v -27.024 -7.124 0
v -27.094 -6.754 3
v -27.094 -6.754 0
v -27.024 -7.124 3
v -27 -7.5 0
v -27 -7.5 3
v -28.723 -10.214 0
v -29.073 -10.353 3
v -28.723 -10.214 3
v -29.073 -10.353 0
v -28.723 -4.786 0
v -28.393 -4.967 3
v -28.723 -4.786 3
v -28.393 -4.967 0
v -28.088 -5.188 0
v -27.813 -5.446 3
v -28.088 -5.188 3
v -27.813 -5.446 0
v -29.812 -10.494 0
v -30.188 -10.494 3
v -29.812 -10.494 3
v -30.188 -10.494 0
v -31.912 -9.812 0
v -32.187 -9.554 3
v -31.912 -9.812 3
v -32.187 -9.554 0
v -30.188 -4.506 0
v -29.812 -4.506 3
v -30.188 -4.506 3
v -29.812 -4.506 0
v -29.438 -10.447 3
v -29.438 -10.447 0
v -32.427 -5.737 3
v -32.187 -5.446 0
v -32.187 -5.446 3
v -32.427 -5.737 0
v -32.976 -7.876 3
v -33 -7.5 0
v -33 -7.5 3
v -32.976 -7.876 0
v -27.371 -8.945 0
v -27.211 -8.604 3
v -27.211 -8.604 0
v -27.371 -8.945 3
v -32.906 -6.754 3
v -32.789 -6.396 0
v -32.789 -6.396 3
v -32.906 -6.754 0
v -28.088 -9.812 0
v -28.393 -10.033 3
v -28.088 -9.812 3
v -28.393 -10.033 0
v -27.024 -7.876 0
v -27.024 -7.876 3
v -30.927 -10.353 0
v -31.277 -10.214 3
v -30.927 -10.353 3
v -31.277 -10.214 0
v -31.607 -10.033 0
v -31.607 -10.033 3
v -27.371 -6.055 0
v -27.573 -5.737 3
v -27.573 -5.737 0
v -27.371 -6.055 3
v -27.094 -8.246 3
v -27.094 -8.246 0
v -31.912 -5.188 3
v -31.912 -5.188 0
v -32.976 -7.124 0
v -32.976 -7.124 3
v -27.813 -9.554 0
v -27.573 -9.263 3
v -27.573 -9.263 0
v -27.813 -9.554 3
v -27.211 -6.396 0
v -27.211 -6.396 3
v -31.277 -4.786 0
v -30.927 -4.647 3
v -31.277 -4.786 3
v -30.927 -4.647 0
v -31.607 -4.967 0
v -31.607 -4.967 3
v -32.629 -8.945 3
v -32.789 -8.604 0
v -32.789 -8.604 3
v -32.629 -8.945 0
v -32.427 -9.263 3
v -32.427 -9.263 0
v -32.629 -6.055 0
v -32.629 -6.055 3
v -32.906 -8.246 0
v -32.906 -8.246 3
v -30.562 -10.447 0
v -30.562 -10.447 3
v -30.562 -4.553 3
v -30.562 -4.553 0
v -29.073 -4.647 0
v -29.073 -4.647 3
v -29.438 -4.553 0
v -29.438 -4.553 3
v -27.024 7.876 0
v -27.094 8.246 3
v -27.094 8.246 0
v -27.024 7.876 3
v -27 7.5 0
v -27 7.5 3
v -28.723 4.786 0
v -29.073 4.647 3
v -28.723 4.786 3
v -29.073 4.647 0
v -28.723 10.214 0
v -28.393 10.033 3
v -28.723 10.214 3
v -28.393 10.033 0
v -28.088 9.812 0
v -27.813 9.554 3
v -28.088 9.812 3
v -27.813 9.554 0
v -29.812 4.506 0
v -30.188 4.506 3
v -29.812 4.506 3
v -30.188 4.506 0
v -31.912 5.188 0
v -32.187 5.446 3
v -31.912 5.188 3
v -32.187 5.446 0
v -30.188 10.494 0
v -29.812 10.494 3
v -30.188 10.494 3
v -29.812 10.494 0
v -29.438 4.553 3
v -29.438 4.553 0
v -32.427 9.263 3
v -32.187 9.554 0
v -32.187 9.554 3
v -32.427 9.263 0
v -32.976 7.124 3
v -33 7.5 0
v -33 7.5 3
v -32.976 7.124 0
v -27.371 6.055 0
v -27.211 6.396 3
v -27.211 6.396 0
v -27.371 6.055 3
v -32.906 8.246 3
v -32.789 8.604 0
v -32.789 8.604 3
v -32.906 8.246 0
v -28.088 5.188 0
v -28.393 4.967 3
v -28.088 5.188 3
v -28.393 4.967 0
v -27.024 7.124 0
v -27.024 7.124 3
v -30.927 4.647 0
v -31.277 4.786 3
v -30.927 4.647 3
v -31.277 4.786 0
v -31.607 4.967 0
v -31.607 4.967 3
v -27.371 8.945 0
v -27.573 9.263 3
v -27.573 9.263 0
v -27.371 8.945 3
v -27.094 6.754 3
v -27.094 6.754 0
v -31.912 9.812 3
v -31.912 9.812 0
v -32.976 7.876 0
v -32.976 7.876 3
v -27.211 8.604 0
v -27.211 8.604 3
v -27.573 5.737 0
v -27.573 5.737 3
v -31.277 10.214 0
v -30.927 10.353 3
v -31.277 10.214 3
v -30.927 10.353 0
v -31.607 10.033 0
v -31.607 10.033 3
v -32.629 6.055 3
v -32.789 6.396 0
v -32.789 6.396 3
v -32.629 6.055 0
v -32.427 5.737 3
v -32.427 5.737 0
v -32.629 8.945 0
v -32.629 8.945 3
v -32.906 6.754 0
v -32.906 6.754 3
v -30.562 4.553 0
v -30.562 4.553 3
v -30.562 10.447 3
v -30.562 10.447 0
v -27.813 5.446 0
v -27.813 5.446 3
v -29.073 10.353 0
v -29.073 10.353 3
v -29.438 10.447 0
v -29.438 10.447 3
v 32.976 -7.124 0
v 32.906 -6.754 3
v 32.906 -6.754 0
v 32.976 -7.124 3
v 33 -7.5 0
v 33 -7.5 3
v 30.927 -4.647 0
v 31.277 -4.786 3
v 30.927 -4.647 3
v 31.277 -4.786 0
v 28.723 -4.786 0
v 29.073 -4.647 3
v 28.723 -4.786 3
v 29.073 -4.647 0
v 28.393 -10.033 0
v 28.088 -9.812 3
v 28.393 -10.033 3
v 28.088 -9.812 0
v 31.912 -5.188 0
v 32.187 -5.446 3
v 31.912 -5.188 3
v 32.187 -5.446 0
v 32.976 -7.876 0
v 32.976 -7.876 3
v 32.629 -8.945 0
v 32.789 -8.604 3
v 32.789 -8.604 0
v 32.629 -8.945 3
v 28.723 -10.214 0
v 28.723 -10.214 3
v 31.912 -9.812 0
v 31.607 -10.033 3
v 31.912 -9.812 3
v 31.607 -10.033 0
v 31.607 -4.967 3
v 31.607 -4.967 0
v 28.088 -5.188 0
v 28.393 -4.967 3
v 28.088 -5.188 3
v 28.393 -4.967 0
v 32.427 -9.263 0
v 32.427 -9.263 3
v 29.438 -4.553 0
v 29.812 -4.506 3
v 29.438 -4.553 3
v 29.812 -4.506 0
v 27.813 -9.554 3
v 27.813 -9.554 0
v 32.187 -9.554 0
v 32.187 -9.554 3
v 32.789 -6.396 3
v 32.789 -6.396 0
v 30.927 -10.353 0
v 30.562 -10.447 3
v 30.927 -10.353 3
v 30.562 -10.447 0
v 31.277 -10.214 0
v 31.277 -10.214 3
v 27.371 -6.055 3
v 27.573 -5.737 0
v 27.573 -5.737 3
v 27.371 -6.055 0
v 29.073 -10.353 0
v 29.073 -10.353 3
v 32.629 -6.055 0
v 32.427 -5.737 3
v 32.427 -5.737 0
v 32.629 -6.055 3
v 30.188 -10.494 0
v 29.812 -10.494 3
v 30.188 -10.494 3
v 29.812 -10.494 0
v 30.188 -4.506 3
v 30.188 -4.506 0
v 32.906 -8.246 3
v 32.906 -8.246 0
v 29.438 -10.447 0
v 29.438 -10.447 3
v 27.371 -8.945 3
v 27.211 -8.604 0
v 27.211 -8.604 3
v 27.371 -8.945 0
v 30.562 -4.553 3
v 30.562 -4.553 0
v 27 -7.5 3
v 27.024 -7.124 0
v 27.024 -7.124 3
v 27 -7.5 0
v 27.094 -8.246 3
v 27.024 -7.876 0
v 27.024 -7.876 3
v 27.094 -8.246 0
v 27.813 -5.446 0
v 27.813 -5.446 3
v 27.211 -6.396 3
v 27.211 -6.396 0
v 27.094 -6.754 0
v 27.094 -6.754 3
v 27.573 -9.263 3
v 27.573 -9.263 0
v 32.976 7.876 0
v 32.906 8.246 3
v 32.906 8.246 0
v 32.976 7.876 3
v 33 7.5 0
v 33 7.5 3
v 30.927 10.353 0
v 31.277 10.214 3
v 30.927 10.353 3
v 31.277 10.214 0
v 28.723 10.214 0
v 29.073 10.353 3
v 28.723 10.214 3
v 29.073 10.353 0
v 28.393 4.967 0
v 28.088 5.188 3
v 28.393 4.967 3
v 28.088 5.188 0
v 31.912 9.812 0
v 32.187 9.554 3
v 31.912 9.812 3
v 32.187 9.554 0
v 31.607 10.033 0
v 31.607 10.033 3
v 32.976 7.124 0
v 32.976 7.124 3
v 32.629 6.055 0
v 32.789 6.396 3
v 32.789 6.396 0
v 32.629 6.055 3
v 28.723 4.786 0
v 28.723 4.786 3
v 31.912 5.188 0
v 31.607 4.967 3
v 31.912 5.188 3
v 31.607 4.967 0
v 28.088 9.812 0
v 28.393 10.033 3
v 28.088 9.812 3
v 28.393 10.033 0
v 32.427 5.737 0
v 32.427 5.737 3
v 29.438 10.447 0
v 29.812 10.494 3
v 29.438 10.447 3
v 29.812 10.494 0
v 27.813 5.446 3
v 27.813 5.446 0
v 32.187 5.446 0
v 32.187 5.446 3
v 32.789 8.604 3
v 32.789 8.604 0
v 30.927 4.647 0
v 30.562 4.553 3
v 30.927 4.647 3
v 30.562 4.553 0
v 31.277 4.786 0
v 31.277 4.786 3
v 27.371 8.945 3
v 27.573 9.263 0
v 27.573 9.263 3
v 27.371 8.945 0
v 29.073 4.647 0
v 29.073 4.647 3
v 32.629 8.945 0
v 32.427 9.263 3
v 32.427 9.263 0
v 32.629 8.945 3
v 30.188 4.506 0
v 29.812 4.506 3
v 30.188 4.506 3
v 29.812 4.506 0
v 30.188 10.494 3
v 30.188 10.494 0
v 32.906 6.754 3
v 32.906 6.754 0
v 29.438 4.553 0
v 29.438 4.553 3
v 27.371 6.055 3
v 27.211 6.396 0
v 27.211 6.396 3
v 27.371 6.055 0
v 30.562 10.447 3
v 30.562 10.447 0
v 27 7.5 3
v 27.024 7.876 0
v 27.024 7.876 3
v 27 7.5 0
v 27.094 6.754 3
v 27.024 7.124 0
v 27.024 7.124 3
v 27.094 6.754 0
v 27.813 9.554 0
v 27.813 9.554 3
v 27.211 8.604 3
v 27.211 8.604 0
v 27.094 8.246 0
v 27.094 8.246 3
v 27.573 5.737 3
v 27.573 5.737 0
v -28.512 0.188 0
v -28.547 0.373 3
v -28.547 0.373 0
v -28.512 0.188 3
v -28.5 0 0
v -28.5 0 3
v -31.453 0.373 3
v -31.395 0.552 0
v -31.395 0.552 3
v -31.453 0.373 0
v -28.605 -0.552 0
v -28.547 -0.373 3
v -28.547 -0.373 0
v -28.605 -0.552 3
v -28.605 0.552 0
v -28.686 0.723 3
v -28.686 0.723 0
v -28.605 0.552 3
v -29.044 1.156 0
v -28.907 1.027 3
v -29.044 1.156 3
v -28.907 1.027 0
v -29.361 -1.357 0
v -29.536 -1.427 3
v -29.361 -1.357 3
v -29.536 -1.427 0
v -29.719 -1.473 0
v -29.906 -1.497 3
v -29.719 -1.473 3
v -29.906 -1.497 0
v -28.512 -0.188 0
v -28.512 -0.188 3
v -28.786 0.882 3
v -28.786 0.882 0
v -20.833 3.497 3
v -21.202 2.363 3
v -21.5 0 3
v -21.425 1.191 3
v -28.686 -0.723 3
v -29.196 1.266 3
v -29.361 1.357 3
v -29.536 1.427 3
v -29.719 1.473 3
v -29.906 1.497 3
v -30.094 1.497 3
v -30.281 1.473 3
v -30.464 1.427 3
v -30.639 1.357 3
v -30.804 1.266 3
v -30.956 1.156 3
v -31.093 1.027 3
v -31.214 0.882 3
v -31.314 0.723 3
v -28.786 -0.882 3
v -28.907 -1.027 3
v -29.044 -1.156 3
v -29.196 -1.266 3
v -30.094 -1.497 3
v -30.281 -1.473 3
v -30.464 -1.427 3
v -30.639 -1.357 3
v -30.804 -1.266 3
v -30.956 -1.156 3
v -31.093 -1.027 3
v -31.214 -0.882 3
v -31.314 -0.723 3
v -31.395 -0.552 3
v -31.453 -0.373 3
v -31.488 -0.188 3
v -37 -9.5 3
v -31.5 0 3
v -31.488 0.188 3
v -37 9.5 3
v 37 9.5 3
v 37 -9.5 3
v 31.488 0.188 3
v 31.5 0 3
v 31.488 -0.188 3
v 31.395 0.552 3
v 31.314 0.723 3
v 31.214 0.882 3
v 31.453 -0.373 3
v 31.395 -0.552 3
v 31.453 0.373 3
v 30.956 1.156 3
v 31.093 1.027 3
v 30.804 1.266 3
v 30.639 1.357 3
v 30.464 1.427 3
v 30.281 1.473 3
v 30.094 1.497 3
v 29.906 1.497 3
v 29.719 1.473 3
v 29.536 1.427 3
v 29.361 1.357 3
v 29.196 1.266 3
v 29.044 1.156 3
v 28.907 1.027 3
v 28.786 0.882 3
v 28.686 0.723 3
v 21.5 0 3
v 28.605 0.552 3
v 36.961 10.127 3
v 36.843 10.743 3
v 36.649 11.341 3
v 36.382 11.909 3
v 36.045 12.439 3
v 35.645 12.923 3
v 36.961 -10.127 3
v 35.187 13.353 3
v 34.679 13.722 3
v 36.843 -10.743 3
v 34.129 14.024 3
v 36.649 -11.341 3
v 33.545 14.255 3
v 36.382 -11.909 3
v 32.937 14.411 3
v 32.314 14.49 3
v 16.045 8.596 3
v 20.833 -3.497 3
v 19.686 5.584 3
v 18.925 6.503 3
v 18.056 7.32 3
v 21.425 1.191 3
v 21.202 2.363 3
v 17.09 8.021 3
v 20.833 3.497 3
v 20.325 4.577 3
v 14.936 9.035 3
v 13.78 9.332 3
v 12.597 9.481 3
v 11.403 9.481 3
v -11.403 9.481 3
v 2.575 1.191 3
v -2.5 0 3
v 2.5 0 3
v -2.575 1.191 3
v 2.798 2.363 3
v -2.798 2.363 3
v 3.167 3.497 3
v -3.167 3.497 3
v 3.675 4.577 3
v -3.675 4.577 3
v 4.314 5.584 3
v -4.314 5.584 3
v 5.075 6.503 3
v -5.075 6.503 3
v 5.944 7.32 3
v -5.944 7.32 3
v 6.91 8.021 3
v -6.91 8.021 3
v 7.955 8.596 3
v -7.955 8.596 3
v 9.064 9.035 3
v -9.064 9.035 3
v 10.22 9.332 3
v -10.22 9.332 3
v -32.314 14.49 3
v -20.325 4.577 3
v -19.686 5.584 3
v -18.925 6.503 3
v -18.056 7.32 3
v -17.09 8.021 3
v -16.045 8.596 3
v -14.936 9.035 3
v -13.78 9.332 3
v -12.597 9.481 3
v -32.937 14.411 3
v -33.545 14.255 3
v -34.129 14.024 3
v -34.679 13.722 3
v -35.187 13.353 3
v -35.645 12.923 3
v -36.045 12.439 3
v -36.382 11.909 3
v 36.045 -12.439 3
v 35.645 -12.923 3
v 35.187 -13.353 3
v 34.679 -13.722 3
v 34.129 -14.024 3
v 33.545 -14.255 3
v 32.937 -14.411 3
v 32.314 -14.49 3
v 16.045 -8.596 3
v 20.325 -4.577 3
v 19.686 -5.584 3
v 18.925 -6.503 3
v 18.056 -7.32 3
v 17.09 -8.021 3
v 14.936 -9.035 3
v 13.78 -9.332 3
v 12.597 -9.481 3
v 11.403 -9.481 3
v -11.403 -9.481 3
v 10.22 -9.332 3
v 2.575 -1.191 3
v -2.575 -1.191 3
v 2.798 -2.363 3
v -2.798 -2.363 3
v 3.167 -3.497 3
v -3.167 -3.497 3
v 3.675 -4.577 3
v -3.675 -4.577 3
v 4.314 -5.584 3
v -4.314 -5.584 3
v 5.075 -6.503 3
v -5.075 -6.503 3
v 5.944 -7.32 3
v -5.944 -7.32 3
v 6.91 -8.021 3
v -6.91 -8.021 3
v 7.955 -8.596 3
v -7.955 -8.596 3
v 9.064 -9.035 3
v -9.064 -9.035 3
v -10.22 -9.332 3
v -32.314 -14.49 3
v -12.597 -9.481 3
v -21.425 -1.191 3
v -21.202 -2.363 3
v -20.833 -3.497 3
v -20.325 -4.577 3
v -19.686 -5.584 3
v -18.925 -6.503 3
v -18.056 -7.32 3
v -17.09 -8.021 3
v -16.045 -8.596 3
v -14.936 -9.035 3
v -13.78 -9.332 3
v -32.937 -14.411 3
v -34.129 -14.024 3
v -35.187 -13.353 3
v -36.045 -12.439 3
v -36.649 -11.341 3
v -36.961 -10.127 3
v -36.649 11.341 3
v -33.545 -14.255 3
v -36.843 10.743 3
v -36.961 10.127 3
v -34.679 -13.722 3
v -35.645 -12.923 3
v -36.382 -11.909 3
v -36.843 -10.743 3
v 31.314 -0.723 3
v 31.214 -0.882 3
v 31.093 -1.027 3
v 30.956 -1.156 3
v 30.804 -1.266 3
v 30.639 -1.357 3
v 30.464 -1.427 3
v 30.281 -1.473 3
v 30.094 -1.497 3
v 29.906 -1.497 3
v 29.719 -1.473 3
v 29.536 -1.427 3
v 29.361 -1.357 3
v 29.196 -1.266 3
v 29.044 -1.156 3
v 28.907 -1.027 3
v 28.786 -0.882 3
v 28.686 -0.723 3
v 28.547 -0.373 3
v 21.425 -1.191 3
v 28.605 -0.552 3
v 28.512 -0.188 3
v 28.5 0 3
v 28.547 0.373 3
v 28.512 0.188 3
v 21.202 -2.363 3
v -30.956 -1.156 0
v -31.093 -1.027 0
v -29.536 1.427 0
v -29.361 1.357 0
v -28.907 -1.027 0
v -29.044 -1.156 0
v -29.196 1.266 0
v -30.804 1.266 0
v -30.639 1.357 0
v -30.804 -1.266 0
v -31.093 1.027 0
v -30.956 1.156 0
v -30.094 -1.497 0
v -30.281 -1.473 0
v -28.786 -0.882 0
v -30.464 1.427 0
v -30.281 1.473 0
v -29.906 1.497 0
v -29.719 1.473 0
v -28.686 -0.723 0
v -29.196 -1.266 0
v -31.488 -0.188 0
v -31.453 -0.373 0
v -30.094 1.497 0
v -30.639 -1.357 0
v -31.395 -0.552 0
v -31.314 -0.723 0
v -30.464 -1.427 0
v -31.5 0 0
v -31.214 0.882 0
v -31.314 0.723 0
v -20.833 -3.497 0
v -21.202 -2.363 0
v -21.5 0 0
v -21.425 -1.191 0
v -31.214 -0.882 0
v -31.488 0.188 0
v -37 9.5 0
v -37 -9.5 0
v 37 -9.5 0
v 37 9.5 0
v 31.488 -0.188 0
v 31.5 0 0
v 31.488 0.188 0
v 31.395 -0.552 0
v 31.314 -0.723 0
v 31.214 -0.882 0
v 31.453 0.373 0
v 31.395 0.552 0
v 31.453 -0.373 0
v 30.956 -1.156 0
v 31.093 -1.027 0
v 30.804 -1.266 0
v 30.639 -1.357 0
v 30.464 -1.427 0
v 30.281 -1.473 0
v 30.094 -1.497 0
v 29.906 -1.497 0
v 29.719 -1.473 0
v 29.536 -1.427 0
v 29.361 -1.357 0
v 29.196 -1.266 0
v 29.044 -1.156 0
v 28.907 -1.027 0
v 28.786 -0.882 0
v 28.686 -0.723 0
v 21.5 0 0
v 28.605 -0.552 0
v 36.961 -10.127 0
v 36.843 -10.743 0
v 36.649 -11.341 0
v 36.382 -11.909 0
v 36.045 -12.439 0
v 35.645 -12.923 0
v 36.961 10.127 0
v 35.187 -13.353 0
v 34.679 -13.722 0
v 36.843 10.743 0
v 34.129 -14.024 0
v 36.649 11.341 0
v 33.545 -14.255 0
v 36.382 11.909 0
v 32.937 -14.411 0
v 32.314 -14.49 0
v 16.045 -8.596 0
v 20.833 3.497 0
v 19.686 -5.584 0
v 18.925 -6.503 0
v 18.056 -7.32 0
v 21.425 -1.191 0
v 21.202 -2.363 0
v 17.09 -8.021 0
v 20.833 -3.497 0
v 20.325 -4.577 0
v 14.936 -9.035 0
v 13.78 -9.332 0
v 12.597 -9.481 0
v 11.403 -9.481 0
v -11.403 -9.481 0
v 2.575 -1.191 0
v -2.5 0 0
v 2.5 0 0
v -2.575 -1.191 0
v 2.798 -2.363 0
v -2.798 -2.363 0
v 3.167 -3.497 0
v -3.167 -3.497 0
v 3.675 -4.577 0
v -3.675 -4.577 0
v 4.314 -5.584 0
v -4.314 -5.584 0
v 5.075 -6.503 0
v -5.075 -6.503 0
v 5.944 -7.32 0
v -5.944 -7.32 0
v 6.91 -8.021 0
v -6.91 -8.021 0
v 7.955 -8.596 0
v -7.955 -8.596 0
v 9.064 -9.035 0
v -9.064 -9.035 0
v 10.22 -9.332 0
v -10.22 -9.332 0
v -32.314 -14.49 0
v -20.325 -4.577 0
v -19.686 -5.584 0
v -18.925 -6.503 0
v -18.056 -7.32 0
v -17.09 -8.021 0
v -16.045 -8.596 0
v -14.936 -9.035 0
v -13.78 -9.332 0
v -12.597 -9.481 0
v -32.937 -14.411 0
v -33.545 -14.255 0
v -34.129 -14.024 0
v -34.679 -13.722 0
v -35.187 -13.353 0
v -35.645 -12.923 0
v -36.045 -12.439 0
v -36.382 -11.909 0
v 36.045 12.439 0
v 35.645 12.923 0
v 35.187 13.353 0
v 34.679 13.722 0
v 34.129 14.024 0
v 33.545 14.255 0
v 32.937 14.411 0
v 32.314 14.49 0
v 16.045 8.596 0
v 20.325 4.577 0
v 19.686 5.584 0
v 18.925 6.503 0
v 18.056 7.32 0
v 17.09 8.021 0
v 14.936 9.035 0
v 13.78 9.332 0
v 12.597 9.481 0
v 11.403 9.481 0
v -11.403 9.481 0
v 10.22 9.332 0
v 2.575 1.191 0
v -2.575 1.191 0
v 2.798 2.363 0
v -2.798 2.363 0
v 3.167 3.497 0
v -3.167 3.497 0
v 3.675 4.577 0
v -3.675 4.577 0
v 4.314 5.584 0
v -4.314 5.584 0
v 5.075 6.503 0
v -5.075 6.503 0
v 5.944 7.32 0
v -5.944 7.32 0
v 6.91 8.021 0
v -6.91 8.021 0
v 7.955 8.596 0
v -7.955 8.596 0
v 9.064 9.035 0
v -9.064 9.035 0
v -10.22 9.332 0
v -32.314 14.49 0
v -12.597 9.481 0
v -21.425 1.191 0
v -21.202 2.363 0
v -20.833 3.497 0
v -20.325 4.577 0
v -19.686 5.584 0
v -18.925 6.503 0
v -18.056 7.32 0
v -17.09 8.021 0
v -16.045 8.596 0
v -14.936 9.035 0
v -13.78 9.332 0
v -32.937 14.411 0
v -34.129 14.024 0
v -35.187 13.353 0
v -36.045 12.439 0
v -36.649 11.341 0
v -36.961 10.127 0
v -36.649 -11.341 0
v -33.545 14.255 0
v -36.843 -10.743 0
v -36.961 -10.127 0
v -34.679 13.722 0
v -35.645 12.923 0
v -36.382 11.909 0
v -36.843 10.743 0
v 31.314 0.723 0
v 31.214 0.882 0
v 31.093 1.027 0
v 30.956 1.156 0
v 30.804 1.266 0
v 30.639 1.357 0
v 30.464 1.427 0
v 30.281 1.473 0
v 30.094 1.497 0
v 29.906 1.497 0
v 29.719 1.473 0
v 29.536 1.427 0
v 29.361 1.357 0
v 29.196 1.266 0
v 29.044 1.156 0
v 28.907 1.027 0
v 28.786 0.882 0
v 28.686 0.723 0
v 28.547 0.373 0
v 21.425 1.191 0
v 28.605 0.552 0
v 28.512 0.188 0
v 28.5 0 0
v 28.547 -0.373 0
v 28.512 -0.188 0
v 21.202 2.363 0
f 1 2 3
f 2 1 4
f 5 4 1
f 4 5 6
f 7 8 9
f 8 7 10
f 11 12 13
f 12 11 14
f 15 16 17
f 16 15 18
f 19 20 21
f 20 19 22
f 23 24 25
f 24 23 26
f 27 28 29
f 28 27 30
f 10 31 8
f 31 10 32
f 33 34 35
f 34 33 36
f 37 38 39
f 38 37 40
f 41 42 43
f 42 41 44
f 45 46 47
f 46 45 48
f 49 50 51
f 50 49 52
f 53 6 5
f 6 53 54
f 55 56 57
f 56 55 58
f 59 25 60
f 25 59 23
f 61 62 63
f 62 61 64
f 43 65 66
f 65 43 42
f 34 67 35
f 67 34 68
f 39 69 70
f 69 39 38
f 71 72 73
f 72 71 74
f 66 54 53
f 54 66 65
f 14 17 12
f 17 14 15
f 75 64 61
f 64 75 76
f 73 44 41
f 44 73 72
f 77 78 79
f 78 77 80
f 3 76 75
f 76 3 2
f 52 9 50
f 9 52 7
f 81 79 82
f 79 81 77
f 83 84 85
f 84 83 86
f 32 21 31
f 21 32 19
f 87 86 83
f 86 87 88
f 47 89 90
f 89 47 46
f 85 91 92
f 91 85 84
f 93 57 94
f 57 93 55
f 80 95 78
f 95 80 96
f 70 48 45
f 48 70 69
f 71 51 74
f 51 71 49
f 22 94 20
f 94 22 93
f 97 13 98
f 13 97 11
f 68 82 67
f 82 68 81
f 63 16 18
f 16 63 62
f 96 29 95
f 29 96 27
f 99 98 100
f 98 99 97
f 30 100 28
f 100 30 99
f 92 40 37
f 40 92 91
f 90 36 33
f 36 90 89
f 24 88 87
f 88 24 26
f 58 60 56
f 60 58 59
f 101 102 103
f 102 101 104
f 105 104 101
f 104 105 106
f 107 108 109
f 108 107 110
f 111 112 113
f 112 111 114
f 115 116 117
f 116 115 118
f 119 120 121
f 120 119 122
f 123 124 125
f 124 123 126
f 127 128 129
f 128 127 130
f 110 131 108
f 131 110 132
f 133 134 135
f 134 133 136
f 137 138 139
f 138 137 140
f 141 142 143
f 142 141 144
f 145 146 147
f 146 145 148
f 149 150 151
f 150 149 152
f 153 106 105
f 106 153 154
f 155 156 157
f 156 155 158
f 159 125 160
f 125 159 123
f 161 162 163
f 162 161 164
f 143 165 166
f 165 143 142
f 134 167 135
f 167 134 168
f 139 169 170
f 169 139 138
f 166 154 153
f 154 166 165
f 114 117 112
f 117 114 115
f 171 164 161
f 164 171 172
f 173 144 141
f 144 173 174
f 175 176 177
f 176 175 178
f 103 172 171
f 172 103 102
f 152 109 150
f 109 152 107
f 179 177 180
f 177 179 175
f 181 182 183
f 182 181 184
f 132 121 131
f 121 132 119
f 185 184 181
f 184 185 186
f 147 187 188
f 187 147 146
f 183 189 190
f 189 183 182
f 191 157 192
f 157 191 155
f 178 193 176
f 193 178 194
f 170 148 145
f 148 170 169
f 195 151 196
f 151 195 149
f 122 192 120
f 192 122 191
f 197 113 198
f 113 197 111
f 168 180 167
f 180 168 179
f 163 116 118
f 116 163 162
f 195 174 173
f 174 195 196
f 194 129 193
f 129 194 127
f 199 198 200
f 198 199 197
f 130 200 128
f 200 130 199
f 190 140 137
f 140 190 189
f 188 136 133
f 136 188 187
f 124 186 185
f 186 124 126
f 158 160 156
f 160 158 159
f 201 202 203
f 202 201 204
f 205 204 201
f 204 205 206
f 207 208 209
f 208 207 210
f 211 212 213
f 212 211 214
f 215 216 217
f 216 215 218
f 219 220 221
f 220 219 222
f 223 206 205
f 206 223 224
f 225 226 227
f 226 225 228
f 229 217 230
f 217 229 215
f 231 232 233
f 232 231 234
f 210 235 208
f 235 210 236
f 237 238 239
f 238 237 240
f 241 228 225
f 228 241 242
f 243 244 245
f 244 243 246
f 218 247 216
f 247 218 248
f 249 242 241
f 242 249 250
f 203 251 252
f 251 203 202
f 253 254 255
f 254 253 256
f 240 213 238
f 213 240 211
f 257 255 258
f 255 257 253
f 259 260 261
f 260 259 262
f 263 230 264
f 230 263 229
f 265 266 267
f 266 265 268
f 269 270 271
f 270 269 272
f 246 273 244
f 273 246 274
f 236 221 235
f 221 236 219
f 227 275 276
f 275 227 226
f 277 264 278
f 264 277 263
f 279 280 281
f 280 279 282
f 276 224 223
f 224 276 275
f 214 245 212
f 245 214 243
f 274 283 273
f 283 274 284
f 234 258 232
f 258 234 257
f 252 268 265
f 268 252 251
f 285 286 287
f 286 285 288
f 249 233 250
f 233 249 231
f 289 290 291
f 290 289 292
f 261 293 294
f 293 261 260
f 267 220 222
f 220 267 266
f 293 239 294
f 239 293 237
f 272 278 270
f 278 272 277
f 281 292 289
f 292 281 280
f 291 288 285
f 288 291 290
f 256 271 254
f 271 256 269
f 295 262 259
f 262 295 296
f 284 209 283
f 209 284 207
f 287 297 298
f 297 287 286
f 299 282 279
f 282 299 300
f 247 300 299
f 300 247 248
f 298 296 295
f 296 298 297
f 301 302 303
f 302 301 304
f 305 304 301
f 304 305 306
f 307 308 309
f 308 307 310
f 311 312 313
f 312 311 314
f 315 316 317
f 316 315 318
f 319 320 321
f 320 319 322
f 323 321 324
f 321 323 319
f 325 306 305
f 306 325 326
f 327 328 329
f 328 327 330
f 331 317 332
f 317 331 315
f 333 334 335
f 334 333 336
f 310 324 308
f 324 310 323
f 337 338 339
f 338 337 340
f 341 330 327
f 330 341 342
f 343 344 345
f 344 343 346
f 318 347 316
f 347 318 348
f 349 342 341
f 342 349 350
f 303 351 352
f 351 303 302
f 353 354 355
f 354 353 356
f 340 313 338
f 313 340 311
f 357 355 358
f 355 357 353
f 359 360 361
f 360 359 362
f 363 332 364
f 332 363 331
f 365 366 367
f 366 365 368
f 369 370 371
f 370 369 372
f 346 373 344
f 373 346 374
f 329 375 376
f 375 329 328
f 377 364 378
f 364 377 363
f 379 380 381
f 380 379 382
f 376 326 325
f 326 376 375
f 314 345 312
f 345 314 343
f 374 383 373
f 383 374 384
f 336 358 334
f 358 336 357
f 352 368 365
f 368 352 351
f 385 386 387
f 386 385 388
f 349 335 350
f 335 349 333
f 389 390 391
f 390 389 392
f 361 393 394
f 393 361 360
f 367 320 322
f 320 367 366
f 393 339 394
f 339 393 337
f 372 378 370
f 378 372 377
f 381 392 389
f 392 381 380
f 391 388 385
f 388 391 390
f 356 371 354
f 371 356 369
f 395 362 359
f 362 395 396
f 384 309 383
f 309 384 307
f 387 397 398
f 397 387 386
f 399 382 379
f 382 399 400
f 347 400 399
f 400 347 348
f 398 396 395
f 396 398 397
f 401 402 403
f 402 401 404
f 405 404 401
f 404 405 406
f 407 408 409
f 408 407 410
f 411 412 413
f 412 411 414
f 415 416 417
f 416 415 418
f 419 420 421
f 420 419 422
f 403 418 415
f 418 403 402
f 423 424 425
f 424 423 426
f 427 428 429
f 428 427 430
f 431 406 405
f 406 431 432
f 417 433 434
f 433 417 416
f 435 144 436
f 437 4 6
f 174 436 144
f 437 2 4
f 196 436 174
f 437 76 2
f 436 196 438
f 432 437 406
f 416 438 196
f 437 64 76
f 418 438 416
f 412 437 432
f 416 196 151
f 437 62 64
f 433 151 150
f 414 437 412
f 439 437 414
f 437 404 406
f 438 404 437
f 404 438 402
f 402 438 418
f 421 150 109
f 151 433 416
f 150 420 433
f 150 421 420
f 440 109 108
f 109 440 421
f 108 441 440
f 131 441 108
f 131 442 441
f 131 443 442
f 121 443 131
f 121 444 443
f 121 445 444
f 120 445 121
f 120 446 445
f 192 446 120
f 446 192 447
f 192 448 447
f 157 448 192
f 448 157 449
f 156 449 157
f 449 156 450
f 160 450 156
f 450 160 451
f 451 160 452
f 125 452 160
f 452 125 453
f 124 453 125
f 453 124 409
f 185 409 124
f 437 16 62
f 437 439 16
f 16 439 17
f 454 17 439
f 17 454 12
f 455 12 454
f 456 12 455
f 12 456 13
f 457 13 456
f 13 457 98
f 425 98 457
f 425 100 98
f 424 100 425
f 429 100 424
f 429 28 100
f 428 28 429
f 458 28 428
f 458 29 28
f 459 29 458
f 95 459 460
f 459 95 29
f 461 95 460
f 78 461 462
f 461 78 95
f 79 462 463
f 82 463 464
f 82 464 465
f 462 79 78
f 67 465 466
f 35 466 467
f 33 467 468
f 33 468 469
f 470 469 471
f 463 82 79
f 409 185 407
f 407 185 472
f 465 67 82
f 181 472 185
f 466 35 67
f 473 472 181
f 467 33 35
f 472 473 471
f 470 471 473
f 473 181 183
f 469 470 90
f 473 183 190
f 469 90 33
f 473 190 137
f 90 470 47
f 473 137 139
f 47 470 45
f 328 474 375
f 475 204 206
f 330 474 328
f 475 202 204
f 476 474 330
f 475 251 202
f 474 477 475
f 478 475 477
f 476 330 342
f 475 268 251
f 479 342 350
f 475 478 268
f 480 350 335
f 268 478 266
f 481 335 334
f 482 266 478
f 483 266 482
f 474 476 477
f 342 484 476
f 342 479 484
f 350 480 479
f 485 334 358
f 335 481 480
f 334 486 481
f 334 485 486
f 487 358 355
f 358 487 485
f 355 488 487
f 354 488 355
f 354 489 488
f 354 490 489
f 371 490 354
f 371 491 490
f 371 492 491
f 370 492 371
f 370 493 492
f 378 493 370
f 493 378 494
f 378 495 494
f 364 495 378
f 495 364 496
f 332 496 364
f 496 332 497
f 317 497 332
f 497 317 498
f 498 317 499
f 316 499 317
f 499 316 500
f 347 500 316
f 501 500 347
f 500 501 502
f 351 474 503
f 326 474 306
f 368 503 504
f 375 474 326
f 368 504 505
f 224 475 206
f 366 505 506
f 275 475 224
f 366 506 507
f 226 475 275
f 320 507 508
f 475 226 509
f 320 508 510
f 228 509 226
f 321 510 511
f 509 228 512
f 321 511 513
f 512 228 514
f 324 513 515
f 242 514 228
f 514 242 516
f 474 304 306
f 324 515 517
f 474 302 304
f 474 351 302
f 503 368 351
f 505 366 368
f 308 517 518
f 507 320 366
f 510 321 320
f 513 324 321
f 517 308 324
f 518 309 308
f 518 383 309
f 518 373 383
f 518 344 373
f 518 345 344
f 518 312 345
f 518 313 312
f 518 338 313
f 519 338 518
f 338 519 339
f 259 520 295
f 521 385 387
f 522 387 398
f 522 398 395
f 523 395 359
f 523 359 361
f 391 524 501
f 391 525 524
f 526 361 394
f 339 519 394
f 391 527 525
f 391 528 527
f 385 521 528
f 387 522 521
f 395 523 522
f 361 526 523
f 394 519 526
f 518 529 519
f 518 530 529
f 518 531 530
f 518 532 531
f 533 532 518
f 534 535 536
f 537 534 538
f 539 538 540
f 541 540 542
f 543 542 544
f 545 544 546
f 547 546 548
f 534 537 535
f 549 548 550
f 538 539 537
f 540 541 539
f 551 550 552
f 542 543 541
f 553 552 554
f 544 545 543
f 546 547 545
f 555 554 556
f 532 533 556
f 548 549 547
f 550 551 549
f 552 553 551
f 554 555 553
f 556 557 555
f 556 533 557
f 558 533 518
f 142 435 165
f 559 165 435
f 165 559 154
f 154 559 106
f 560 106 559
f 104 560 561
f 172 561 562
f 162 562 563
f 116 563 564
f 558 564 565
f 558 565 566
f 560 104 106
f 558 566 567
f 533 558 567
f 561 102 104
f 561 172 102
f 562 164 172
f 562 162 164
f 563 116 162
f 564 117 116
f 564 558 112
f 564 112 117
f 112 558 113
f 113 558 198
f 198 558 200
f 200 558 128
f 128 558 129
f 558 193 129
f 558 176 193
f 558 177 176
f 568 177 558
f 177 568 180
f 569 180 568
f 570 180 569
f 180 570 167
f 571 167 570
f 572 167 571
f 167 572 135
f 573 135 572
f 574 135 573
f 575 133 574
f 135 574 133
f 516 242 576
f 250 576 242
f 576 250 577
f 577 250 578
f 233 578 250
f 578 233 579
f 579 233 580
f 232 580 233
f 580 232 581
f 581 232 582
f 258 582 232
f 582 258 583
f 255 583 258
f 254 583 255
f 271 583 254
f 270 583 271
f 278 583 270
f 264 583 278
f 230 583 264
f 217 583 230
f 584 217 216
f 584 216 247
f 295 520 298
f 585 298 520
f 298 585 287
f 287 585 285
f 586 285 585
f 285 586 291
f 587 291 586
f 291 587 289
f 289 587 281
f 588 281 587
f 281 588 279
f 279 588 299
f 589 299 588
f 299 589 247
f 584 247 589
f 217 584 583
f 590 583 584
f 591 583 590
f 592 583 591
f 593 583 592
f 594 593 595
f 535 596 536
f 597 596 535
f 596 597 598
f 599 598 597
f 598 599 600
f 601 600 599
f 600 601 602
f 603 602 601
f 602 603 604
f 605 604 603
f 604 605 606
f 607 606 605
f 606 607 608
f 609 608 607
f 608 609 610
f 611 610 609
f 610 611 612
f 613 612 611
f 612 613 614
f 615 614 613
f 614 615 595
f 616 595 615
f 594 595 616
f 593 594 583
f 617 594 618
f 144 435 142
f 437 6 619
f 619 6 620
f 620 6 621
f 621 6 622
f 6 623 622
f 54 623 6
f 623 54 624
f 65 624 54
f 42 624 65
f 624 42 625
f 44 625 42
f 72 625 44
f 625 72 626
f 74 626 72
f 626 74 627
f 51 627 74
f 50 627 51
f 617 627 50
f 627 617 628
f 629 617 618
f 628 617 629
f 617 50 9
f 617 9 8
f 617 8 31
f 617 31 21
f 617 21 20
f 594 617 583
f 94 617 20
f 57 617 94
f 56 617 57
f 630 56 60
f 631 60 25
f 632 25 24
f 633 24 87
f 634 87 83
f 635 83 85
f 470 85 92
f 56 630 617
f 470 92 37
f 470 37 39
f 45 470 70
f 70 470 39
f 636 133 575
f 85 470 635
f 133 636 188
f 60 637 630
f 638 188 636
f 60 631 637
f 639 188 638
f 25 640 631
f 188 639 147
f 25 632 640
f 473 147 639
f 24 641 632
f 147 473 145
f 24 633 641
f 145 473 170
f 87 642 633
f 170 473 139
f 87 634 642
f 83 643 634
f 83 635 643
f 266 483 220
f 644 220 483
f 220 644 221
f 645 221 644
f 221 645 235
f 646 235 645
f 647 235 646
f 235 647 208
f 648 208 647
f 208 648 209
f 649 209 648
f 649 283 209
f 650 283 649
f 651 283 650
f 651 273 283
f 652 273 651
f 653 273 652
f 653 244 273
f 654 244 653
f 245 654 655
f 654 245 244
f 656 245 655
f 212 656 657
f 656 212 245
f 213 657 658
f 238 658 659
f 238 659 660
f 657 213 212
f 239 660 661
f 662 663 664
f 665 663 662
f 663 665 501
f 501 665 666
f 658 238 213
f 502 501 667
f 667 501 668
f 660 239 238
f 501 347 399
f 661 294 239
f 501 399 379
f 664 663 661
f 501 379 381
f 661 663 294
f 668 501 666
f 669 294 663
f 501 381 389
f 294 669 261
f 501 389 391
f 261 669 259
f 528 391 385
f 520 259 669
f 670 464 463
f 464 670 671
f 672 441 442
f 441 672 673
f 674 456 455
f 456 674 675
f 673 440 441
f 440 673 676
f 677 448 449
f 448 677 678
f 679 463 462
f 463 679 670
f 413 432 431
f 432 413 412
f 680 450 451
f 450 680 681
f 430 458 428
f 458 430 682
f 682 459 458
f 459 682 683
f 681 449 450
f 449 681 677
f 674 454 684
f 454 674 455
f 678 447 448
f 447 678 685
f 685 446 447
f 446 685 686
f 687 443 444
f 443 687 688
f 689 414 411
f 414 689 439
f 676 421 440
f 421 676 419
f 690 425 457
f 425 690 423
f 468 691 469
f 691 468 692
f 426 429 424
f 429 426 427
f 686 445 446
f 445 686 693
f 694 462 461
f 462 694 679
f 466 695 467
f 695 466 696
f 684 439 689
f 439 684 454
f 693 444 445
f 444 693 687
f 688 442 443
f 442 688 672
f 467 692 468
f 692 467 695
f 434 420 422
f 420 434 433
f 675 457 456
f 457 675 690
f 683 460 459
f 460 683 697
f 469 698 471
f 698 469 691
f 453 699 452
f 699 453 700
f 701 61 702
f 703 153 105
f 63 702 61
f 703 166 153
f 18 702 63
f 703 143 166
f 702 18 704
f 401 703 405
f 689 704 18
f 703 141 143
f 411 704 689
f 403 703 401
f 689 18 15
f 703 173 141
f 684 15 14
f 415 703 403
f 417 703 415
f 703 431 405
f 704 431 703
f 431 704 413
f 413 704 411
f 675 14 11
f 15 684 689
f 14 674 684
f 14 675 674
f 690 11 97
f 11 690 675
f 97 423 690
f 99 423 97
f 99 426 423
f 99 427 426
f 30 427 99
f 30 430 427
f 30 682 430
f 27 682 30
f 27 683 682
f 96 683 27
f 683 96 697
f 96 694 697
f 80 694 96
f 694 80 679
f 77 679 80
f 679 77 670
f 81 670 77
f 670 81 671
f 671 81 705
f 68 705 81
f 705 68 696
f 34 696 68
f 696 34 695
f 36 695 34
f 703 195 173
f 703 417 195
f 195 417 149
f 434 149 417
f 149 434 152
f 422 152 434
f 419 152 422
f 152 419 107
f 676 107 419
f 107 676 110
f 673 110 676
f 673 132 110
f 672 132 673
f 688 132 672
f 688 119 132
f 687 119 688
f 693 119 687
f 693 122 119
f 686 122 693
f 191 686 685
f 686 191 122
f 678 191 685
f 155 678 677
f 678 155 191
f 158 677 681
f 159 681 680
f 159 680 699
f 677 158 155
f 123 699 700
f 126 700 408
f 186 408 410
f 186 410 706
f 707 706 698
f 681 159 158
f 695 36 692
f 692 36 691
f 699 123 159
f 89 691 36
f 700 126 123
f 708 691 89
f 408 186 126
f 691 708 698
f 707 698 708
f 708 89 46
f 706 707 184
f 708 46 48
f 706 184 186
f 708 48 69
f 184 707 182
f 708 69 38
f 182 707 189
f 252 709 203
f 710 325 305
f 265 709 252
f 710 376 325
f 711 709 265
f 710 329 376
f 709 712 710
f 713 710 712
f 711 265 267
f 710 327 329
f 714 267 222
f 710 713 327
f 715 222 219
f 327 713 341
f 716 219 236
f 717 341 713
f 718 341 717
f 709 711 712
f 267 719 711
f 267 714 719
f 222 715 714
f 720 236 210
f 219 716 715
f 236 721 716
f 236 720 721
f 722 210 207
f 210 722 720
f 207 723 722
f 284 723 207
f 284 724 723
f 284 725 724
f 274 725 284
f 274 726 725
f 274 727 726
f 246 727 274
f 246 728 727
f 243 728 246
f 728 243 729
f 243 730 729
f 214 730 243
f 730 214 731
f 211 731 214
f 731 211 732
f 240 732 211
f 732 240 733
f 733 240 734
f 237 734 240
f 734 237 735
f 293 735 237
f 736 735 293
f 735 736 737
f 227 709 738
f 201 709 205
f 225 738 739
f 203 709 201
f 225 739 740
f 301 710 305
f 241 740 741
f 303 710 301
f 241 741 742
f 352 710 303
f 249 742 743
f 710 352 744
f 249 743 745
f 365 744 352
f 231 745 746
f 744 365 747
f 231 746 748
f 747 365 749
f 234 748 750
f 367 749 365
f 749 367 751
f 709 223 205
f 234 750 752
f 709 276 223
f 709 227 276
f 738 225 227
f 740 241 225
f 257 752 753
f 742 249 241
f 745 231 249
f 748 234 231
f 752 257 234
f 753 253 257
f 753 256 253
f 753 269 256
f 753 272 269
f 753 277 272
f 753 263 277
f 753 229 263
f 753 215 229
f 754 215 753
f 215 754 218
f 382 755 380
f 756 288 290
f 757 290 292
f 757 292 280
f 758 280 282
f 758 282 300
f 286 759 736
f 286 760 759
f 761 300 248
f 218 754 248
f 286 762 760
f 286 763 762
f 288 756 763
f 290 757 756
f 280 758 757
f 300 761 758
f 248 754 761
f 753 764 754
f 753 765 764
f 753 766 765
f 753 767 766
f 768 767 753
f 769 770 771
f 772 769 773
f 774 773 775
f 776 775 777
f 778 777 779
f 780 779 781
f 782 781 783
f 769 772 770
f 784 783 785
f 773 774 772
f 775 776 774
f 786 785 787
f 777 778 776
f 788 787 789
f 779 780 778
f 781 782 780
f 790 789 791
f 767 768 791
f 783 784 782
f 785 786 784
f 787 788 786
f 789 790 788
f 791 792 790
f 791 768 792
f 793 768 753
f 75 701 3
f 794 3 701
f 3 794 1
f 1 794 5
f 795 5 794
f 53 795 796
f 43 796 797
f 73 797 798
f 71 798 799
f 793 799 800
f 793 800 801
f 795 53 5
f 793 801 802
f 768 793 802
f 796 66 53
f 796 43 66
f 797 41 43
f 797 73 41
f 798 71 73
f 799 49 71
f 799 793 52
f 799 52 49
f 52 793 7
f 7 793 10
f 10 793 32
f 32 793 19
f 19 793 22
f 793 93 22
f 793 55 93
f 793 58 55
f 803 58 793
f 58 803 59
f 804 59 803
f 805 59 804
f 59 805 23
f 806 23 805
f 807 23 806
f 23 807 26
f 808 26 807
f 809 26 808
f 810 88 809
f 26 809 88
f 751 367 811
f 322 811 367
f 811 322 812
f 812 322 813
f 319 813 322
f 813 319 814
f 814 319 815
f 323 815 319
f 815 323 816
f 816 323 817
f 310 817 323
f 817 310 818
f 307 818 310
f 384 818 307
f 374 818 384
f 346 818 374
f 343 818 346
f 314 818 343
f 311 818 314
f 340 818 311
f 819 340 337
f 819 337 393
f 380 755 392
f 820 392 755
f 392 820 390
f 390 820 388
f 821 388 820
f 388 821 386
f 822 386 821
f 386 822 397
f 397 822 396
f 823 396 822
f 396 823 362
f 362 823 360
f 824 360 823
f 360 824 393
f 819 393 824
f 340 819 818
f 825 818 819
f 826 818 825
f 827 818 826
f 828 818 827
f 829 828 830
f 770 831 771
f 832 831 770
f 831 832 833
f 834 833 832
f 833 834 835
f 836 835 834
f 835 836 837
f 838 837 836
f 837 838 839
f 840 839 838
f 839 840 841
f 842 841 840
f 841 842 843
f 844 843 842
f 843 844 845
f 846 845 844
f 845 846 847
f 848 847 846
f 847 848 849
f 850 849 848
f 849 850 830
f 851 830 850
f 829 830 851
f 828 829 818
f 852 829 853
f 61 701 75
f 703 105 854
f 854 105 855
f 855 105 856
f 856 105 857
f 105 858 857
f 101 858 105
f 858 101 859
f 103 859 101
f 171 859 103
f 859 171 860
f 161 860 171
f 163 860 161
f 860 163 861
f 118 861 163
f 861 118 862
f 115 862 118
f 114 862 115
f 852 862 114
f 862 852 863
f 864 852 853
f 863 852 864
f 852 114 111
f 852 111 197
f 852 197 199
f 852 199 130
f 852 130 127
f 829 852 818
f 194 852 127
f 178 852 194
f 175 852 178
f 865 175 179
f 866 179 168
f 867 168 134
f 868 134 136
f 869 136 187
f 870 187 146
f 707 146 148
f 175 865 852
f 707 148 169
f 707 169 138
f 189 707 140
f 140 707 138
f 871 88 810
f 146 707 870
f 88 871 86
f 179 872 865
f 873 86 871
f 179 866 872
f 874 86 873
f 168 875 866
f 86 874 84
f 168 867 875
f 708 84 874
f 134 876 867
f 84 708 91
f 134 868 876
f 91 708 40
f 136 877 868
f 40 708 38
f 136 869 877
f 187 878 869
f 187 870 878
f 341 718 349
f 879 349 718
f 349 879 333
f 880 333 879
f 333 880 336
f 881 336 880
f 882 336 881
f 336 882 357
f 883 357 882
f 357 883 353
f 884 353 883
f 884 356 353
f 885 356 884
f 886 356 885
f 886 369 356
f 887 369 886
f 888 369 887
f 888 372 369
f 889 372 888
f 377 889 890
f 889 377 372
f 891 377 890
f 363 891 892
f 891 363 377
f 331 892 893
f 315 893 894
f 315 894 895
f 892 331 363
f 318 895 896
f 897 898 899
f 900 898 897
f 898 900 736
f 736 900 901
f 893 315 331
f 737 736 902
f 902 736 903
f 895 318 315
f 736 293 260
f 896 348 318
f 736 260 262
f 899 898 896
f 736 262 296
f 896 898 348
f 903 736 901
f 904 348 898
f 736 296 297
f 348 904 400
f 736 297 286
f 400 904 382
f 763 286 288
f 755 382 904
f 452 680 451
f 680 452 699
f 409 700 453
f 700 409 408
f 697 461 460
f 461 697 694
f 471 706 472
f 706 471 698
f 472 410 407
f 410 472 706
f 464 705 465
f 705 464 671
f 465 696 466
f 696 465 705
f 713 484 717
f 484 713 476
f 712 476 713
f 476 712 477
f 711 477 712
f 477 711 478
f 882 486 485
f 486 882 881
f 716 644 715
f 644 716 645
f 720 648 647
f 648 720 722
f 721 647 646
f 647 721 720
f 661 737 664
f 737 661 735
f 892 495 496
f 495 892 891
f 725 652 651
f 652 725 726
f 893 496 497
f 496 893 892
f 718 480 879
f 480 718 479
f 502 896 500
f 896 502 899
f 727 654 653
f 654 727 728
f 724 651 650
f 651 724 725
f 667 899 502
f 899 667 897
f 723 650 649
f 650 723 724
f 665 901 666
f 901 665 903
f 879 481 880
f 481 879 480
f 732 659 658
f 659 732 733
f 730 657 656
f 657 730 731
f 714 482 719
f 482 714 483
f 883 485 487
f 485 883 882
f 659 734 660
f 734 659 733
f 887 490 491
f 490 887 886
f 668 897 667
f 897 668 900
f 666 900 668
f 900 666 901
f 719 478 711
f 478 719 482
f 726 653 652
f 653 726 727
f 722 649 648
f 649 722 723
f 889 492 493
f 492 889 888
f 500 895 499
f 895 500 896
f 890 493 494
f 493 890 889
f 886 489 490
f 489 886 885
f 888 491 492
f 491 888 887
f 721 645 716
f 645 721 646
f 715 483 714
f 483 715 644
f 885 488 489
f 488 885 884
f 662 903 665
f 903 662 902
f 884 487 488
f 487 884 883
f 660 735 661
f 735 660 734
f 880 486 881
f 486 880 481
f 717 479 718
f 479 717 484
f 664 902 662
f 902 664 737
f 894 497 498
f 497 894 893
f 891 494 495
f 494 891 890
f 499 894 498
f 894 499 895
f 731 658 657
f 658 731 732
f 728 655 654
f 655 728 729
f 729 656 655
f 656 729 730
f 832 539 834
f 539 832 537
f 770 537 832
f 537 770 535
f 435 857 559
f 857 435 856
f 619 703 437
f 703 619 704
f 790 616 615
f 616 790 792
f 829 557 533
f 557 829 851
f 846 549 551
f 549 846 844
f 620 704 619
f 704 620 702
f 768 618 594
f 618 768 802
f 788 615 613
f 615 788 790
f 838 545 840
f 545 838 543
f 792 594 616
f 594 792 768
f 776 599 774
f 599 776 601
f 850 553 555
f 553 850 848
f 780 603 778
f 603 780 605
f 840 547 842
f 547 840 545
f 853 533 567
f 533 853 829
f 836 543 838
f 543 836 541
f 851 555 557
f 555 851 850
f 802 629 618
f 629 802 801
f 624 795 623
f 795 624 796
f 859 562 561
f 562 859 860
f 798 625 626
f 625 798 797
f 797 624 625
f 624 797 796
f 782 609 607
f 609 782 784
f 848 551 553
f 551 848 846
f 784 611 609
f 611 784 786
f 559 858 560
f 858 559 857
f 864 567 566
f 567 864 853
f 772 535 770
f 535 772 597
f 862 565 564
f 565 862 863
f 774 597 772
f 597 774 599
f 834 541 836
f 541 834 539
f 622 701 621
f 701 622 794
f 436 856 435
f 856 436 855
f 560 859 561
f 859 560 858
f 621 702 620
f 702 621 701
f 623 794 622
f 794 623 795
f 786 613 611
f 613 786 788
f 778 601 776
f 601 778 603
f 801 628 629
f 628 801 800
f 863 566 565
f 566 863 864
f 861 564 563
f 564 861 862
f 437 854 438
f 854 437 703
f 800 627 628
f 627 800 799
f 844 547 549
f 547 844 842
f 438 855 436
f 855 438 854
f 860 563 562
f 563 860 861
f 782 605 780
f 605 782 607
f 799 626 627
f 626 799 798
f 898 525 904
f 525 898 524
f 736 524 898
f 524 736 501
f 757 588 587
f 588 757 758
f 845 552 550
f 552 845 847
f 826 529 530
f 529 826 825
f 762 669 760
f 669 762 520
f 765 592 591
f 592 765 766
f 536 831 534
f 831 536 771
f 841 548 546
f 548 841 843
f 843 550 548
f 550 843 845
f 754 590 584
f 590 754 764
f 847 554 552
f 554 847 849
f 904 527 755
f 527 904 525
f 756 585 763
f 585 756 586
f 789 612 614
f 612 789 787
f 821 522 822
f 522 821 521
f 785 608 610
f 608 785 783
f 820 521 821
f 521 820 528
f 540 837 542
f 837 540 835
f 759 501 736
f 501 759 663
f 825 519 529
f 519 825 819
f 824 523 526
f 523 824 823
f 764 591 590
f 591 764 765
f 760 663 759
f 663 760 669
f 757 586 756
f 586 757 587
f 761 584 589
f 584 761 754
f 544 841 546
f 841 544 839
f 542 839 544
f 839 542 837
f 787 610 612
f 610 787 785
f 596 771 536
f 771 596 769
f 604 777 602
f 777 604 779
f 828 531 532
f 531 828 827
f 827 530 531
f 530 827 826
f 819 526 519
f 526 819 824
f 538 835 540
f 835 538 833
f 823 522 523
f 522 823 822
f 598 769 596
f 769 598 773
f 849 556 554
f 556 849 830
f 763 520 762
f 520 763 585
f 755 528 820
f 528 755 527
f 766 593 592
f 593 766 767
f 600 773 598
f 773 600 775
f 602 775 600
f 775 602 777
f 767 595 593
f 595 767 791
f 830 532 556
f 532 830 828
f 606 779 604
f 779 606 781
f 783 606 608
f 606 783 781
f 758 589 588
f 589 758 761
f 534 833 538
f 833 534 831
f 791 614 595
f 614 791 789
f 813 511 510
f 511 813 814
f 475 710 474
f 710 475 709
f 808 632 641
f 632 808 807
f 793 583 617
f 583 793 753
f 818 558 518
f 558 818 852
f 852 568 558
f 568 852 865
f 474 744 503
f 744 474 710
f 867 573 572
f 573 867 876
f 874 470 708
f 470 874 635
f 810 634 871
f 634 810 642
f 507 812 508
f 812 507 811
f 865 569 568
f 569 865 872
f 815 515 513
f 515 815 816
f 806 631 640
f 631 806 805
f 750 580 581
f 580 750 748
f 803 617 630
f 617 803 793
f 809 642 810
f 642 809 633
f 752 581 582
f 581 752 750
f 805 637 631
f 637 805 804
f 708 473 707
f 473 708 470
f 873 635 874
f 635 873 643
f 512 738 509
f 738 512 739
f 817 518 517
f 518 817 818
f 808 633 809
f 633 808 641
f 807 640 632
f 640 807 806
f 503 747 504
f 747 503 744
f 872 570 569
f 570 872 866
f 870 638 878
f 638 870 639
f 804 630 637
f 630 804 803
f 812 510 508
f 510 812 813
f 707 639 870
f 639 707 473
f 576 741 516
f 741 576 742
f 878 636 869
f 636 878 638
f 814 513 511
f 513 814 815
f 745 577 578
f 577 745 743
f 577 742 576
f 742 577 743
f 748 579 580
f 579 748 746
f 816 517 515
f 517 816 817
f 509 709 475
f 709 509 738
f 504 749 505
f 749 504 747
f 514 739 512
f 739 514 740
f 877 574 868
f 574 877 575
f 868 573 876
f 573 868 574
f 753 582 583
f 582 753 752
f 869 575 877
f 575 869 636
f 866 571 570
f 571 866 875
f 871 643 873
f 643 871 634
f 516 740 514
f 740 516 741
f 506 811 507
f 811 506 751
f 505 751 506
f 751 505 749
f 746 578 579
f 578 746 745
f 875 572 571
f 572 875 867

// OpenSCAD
$fn = 50;


difference() {
	union() {
		hull() {
			translate(v = [-32.0000000000, 9.5000000000, 0]) {
				cylinder(h = 3, r = 5);
			}
			translate(v = [32.0000000000, 9.5000000000, 0]) {
				cylinder(h = 3, r = 5);
			}
			translate(v = [-32.0000000000, -9.5000000000, 0]) {
				cylinder(h = 3, r = 5);
			}
			translate(v = [32.0000000000, -9.5000000000, 0]) {
				cylinder(h = 3, r = 5);
			}
		}
	}
	union() {
		#translate(v = [-30.0000000000, -7.5000000000, 0]) {
			cylinder(h = 3, r = 3.0000000000);
		}
		#translate(v = [-30.0000000000, 7.5000000000, 0]) {
			cylinder(h = 3, r = 3.0000000000);
		}
		#translate(v = [30.0000000000, -7.5000000000, 0]) {
			cylinder(h = 3, r = 3.0000000000);
		}
		#translate(v = [30.0000000000, 7.5000000000, 0]) {
			cylinder(h = 3, r = 3.0000000000);
		}
		#translate(v = [-30.0000000000, -7.5000000000, -100.0000000000]) {
			cylinder(h = 200, r = 3.0000000000);
		}
		#translate(v = [-30.0000000000, 7.5000000000, -100.0000000000]) {
			cylinder(h = 200, r = 3.0000000000);
		}
		#translate(v = [30.0000000000, -7.5000000000, -100.0000000000]) {
			cylinder(h = 200, r = 3.0000000000);
		}
		#translate(v = [30.0000000000, 7.5000000000, -100.0000000000]) {
			cylinder(h = 200, r = 3.0000000000);
		}
		#translate(v = [-30.0000000000, -7.5000000000, 0]) {
			cylinder(h = 3, r = 1.5000000000);
		}
		#translate(v = [-30.0000000000, 0.0000000000, 0]) {
			cylinder(h = 3, r = 1.5000000000);
		}
		#translate(v = [-30.0000000000, 7.5000000000, 0]) {
			cylinder(h = 3, r = 1.5000000000);
		}
		#translate(v = [30.0000000000, -7.5000000000, 0]) {
			cylinder(h = 3, r = 1.5000000000);
		}
		#translate(v = [30.0000000000, 0.0000000000, 0]) {
			cylinder(h = 3, r = 1.5000000000);
		}
		#translate(v = [30.0000000000, 7.5000000000, 0]) {
			cylinder(h = 3, r = 1.5000000000);
		}
		#translate(v = [-30.0000000000, -7.5000000000, 0]) {
			cylinder(h = 3, r = 1.5000000000);
		}
		#translate(v = [-30.0000000000, 0.0000000000, 0]) {
			cylinder(h = 3, r = 1.5000000000);
		}
		#translate(v = [-30.0000000000, 7.5000000000, 0]) {
			cylinder(h = 3, r = 1.5000000000);
		}
		#translate(v = [30.0000000000, -7.5000000000, 0]) {
			cylinder(h = 3, r = 1.5000000000);
		}
		#translate(v = [30.0000000000, 0.0000000000, 0]) {
			cylinder(h = 3, r = 1.5000000000);
		}
		#translate(v = [30.0000000000, 7.5000000000, 0]) {
			cylinder(h = 3, r = 1.5000000000);
		}
		#translate(v = [-30.0000000000, -7.5000000000, 0]) {
			cylinder(h = 3, r = 1.5000000000);
		}
		#translate(v = [-30.0000000000, 0.0000000000, 0]) {
			cylinder(h = 3, r = 1.5000000000);
		}
		#translate(v = [-30.0000000000, 7.5000000000, 0]) {
			cylinder(h = 3, r = 1.5000000000);
		}
		#translate(v = [30.0000000000, -7.5000000000, 0]) {
			cylinder(h = 3, r = 1.5000000000);
		}
		#translate(v = [30.0000000000, 0.0000000000, 0]) {
			cylinder(h = 3, r = 1.5000000000);
		}
		#translate(v = [30.0000000000, 7.5000000000, 0]) {
			cylinder(h = 3, r = 1.5000000000);
		}
		#translate(v = [-12.0000000000, 0, 0]) {
			cylinder(h = 3, r = 9.5000000000);
		}
		#translate(v = [12.0000000000, 0, 0]) {
			cylinder(h = 3, r = 9.5000000000);
		}
	}
}
